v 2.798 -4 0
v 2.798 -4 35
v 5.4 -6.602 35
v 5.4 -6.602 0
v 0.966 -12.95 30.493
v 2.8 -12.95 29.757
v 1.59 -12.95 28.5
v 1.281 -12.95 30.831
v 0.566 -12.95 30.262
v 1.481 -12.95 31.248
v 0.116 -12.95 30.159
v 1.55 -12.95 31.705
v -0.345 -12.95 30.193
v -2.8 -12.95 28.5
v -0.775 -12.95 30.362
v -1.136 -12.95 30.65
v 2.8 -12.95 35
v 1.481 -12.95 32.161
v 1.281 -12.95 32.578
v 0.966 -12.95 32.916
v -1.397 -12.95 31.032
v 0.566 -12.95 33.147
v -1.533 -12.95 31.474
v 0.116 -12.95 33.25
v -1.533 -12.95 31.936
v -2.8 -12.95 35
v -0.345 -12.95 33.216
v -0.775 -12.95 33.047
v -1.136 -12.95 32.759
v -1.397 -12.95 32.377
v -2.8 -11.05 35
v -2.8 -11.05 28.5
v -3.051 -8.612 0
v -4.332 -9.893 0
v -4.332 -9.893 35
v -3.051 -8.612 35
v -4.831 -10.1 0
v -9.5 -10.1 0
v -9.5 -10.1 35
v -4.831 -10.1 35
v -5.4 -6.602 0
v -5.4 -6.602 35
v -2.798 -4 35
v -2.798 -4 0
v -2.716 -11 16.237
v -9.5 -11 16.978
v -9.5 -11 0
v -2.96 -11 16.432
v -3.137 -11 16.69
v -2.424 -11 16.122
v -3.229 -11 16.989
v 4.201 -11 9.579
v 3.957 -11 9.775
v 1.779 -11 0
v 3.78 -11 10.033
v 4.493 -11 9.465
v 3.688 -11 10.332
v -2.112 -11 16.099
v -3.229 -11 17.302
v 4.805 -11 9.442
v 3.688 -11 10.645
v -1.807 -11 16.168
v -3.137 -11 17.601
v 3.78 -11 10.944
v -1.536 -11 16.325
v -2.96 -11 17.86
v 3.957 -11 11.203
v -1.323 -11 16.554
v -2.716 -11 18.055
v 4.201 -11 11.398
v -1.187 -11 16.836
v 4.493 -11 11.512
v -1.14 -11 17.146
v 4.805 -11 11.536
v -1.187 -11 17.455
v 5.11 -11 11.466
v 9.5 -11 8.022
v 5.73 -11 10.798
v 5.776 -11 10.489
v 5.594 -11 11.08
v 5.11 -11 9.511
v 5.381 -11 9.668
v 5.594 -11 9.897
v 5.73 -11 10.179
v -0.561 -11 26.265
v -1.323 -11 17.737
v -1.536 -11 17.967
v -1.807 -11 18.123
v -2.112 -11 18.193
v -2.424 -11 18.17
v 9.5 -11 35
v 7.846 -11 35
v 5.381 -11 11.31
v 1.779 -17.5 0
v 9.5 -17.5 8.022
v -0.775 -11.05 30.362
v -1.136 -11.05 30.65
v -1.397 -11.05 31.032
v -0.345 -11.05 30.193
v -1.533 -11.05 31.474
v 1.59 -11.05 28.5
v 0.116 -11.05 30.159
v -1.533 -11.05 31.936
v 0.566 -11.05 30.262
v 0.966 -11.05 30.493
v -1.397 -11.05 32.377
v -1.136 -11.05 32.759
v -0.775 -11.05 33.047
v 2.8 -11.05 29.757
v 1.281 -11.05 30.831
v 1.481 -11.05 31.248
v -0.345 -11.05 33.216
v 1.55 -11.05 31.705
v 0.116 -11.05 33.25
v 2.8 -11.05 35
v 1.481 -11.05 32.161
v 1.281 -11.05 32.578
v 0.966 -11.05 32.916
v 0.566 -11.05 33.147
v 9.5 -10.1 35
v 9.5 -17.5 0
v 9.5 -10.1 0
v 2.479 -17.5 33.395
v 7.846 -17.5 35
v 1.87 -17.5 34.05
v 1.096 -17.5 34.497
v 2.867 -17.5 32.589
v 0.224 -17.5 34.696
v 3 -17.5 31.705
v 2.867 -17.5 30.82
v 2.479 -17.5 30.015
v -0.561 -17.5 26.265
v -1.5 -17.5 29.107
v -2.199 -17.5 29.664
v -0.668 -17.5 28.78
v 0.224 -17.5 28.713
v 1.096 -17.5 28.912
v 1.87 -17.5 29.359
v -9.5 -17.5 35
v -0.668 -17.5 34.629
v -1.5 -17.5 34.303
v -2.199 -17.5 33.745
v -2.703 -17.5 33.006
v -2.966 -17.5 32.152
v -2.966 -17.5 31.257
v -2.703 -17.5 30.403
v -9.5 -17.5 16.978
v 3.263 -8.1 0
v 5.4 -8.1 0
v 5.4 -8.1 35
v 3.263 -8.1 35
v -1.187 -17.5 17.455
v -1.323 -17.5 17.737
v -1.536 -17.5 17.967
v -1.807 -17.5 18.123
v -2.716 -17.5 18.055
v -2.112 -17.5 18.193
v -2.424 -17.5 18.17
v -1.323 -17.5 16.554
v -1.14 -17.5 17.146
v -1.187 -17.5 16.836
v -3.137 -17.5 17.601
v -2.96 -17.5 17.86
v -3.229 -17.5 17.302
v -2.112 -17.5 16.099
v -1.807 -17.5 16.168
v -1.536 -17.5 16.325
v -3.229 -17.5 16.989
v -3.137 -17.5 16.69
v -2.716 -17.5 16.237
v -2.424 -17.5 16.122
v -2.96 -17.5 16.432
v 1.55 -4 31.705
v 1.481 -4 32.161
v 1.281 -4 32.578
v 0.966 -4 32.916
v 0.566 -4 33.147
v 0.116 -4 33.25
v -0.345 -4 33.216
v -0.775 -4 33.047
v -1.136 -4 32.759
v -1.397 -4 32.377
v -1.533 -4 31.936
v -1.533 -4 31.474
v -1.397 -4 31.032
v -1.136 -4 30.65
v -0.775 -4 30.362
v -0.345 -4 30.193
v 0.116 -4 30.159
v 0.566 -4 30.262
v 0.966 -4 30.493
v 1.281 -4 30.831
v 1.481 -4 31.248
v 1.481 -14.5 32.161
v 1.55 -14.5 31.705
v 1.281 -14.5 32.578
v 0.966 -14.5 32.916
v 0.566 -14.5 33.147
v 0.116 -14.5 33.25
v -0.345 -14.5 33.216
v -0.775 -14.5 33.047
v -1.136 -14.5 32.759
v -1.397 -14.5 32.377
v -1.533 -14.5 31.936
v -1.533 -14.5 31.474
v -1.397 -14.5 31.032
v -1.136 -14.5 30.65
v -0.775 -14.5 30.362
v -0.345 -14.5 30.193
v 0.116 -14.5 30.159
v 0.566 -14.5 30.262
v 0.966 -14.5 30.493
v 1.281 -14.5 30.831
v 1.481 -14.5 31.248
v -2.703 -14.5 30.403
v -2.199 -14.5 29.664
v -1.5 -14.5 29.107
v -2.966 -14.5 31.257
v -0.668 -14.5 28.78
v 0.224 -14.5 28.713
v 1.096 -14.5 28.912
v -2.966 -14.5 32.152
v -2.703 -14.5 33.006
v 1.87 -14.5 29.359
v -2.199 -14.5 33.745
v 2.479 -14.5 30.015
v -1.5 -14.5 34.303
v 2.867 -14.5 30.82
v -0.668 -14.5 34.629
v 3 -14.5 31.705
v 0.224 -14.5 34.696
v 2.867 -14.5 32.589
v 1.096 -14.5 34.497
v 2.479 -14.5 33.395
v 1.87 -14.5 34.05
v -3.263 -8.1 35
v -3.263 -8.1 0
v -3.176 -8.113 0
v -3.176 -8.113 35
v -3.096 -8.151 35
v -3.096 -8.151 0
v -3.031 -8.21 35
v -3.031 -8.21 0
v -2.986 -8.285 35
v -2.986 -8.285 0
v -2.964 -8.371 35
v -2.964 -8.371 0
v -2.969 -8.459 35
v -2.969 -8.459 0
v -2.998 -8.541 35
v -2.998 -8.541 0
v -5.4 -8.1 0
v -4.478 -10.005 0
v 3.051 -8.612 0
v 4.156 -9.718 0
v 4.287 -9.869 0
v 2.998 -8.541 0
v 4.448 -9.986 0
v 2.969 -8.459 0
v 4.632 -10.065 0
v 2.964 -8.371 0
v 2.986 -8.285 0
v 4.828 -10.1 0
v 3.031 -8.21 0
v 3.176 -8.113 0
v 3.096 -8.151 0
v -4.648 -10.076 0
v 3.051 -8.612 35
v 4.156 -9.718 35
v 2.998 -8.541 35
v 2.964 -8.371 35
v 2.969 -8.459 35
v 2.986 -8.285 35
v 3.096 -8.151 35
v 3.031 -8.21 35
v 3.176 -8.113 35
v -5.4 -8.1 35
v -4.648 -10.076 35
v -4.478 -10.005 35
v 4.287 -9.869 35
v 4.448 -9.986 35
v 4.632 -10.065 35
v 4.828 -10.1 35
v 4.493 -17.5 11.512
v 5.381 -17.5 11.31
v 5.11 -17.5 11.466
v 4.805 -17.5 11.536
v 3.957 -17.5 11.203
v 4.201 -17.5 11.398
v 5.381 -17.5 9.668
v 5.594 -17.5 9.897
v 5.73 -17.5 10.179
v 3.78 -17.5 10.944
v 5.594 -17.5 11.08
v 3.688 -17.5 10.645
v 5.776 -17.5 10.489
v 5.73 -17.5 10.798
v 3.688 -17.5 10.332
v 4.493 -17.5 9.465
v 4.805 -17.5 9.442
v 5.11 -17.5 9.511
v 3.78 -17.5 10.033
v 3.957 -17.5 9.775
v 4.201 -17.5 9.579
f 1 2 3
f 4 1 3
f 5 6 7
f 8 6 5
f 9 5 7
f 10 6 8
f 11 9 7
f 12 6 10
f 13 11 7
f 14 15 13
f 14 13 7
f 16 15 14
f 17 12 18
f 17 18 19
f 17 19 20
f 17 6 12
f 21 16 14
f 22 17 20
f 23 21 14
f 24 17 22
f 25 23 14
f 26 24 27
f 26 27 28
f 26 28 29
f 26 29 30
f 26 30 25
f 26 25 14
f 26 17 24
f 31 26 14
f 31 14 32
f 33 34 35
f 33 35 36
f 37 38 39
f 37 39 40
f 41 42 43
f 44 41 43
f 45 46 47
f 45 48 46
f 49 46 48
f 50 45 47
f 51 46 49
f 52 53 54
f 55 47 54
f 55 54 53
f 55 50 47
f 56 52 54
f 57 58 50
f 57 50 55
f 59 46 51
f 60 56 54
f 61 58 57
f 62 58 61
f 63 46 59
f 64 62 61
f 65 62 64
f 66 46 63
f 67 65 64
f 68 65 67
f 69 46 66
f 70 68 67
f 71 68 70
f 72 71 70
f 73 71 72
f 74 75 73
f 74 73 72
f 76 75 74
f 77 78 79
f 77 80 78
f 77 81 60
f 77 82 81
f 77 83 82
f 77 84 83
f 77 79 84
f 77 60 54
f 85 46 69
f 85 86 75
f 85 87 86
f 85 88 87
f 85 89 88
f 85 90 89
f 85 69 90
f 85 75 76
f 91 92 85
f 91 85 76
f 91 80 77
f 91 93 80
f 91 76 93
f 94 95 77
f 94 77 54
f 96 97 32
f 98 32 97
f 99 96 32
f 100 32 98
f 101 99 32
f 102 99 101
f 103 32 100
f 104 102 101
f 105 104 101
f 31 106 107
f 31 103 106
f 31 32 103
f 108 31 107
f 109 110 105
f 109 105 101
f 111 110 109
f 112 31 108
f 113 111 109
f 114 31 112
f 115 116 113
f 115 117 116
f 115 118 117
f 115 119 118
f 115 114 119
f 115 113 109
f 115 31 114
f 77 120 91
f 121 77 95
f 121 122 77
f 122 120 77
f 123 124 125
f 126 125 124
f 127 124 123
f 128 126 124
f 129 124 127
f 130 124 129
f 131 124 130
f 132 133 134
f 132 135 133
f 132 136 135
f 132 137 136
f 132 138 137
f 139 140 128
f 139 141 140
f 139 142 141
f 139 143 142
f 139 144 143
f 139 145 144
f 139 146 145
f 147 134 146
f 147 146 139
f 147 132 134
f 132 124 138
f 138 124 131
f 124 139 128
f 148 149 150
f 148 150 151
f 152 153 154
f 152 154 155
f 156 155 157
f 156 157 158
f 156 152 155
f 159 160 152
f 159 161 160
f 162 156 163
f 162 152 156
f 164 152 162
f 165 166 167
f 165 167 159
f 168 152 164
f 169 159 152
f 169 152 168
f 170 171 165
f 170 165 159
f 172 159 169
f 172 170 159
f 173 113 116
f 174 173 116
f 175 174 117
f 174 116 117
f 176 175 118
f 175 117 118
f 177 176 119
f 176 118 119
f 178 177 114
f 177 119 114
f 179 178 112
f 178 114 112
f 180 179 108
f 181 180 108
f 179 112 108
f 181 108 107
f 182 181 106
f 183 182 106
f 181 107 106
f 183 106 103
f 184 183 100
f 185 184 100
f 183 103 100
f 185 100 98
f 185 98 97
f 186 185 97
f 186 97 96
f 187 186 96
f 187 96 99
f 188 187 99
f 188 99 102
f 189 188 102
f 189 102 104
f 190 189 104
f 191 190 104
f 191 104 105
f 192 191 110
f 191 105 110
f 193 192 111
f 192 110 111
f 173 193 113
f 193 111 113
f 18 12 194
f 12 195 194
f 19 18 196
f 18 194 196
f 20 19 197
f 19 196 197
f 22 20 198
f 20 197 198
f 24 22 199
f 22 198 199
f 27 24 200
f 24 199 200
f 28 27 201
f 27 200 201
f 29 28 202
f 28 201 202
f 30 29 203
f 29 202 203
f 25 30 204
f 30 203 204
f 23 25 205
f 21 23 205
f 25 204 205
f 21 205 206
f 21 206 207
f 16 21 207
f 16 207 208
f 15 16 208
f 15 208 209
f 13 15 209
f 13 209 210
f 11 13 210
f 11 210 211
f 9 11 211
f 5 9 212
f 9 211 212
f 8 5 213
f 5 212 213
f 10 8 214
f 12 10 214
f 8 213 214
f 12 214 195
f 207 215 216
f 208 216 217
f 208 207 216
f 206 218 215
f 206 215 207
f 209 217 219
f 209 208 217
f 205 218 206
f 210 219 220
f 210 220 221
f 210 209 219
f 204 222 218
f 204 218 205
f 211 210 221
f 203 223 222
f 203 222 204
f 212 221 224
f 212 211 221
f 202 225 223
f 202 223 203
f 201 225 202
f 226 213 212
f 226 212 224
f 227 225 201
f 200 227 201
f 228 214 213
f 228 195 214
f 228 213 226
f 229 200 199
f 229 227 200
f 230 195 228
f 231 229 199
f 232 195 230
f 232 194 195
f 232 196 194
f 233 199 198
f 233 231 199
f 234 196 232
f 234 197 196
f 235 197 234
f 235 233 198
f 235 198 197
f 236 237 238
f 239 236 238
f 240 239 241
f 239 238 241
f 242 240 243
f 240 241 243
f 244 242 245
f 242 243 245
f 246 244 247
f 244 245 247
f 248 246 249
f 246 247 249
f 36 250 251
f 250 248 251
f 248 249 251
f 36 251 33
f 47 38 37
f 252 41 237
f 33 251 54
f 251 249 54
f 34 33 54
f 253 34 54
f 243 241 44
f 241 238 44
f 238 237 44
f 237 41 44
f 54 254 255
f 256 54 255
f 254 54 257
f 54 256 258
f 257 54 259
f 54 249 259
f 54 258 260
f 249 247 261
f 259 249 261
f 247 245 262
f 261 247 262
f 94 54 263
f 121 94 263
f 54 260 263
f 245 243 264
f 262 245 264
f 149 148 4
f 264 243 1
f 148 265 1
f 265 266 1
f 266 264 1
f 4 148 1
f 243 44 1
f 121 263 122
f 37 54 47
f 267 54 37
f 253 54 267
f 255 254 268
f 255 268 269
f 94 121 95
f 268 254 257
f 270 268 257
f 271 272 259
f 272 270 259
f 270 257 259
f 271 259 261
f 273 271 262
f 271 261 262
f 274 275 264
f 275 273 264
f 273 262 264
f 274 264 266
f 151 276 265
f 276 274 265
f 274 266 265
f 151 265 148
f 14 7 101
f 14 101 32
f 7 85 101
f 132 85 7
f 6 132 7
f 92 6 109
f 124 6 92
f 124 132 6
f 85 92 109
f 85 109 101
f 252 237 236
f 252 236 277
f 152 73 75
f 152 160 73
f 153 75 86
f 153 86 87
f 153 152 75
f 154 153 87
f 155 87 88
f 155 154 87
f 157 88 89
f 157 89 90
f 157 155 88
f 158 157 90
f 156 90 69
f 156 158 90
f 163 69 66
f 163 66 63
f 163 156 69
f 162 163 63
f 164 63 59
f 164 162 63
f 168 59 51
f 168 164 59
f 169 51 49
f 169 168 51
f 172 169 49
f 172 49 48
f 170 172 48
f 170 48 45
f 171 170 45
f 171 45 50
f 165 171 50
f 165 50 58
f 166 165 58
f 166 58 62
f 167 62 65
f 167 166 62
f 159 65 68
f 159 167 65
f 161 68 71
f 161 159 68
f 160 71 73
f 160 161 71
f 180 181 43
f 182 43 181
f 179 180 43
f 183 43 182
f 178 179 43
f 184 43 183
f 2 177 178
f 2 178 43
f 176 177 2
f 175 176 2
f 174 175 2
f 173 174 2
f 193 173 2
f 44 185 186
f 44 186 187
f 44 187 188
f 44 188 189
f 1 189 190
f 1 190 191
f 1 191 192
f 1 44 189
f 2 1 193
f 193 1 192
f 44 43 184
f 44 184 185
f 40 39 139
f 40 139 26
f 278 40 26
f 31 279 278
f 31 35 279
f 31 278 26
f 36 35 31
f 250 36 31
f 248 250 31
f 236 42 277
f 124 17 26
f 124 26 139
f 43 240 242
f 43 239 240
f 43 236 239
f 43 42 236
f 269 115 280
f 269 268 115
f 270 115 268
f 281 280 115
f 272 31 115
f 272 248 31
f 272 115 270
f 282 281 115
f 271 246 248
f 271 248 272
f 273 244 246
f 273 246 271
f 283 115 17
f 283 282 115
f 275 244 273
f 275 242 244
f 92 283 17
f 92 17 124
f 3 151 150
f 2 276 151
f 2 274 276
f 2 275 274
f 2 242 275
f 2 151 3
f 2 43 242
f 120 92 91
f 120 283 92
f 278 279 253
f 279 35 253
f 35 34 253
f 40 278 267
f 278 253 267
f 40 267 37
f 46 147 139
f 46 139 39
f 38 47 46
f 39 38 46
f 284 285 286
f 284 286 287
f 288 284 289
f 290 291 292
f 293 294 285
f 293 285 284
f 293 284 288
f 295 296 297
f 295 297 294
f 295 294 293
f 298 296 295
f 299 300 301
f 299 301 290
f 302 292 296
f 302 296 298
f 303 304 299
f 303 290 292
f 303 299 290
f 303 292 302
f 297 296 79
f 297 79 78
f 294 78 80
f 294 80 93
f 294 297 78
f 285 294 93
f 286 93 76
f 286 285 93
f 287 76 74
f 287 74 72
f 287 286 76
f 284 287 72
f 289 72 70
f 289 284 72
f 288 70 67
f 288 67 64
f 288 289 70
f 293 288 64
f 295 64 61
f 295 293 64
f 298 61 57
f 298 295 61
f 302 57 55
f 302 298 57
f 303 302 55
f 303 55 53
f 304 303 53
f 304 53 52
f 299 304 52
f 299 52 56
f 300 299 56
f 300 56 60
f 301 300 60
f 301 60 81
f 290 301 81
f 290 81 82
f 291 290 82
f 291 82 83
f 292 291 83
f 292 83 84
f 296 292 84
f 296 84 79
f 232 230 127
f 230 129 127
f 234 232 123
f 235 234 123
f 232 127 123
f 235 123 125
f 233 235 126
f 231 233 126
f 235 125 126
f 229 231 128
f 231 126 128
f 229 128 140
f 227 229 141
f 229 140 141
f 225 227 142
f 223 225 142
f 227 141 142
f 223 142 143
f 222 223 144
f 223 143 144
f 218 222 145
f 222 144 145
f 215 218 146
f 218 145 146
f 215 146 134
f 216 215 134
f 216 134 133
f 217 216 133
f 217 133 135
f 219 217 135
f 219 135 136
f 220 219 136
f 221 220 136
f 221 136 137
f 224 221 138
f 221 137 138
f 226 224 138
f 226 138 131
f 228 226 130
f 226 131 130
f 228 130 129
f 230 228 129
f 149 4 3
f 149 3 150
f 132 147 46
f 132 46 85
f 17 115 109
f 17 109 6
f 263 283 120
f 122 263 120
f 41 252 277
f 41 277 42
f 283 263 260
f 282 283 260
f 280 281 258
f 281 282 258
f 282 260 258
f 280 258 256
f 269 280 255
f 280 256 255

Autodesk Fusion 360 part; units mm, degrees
sketch "Sketch1" plane through (0, 0, 0) normal (0, 0, 1) x (1, 0, 0)
  line L0 (10, 4.8314) -> (10, 9.5)
  line L1 (-4.4022, -9.8222) -> (-3.1214, -8.5414)
  arc A0 (3.2628, -8.2) -> (3.1214, -8.5414) centre (3.2628, -8.4) ccw
  line L2 (-5.5, 6.5607) -> (-5.5, 8.2)
  line L3 (-5.5, -6.5607) -> (-2.8393, -3.9)
  line L4 (-4.8314, 10) -> (-9.5, 10)
  line L5 (2.8393, 3.9) -> (-2.8393, 3.9)
  arc A1 (-10, -9.5) -> (-9.5, -10) centre (-9.5, -9.5) ccw
  line L6 (9.5, 10) -> (4.8314, 10)
  arc A2 (-3.2628, 8.2) -> (-3.1214, 8.5414) centre (-3.2628, 8.4) ccw
  line L7 (-8.2, 3.2628) -> (-8.2, 5.5)
  line L8 (2.8393, -3.9) -> (5.5, -6.5607)
  line L9 (-10, 9.5) -> (-10, 4.9)
  arc A3 (9.5, -10) -> (10, -9.5) centre (9.5, -9.5) ccw
  line L10 (-6.5607, -5.5) -> (-8.2, -5.5)
  line L11 (3.1214, -8.5414) -> (4.2336, -9.6536)
  line L12 (-8.2, -5.5) -> (-8.2, -3.2628)
  line L13 (-9.9987, -4.7917) -> (-10, -9.5)
  line L14 (10, -9.5) -> (10, -4.8314)
  line L15 (3.2628, 8.2) -> (5.5, 8.2)
  arc A4 (8.5414, -3.1214) -> (8.2, -3.2628) centre (8.4, -3.2628) ccw
  arc A5 (-3.1214, -8.5414) -> (-3.2628, -8.2) centre (-3.2628, -8.4) ccw
  line L16 (4.8314, -10) -> (9.5, -10)
  line L17 (-3.9, -2.8393) -> (-6.5607, -5.5)
  line L18 (-3.2628, -8.2) -> (-5.5, -8.2)
  line L19 (3.9, 2.8393) -> (6.5607, 5.5)
  line L20 (-3.1214, 8.5414) -> (-4.4312, 9.8494)
  line L21 (8.2, -5.5) -> (6.5607, -5.5)
  arc A6 (-10, 4.9) -> (-9.8494, 4.4312) centre (-9.3734, 4.8428) ccw
  line L22 (8.5414, 3.1214) -> (9.8222, 4.4022)
  circle A7 centre (0, 0) radius 2.1
  line L23 (3.9, -2.8393) -> (3.9, 2.8393)
  line L24 (6.5607, -5.5) -> (3.9, -2.8393)
  line L25 (5.5, -6.5607) -> (5.5, -8.2)
  line L26 (8.2, -3.2628) -> (8.2, -5.5)
  arc A8 (10, -4.8314) -> (9.8222, -4.4022) centre (9.3929, -4.8314) ccw
  line L27 (-5.5, -8.2) -> (-5.5, -6.5607)
  arc A9 (-4.8314, -10) -> (-4.4022, -9.8222) centre (-4.8314, -9.3929) ccw
  line L28 (5.5, -8.2) -> (3.2628, -8.2)
  line L29 (9.8222, -4.4022) -> (8.5414, -3.1214)
  arc A10 (-9.8222, -4.4022) -> (-9.9987, -4.7917) centre (-9.3929, -4.8314) ccw
  line L30 (-8.5414, -3.1214) -> (-9.8222, -4.4022)
  arc A11 (4.2336, -9.6536) -> (4.8314, -10) centre (4.8837, -9.2207) ccw
  arc A12 (-8.2, -3.2628) -> (-8.5414, -3.1214) centre (-8.4, -3.2628) ccw
  line L31 (-9.5, -10) -> (-4.8314, -10)
  line L32 (-2.8393, -3.9) -> (2.8393, -3.9)
  line L33 (-5.8557, 10) -> (6.4454, 10) construction
  arc A13 (10, 9.5) -> (9.5, 10) centre (9.5, 9.5) ccw
  arc A14 (3.1214, 8.5414) -> (3.2628, 8.2) centre (3.2628, 8.4) ccw
  line L34 (-5.5, 8.2) -> (-3.2628, 8.2)
  line L35 (-3.9, 2.8393) -> (-3.9, -2.8393)
  line L36 (4.4022, 9.8222) -> (3.1214, 8.5414)
  arc A15 (4.8314, 10) -> (4.4022, 9.8222) centre (4.8314, 9.3929) ccw
  line L37 (-9.8494, 4.4312) -> (-8.5414, 3.1214)
  line L38 (5.5, 8.2) -> (5.5, 6.5607)
  line L39 (6.5607, 5.5) -> (8.2, 5.5)
  arc A16 (-8.5414, 3.1214) -> (-8.2, 3.2628) centre (-8.4, 3.2628) ccw
  line L40 (8.2, 5.5) -> (8.2, 3.2628)
  arc A17 (-4.4312, 9.8494) -> (-4.8314, 10) centre (-4.8314, 9.3929) ccw
  line L41 (-8.2, 5.5) -> (-6.5607, 5.5)
  arc A18 (9.8222, 4.4022) -> (10, 4.8314) centre (9.3929, 4.8314) ccw
  arc A19 (-9.5, 10) -> (-10, 9.5) centre (-9.5, 9.5) ccw
  line L42 (-2.8393, 3.9) -> (-5.5, 6.5607)
  line L43 (-6.5607, 5.5) -> (-3.9, 2.8393)
  arc A20 (8.2, 3.2628) -> (8.5414, 3.1214) centre (8.4, 3.2628) ccw
  line L44 (5.5, 6.5607) -> (2.8393, 3.9)
  line L45 (5.4, -6.6021) -> (5.4, -8.1)
  line L46 (5.4, -8.1) -> (3.2628, -8.1)
  arc A21 (3.2628, -8.1) -> (3.0507, -8.6121) centre (3.2628, -8.4) ccw
  line L47 (3.0507, -8.6121) -> (4.1561, -9.7175)
  arc A22 (4.1561, -9.7175) -> (4.8282, -10.1) centre (4.8837, -9.2207) ccw
  line L48 (4.8282, -10.1) -> (9.5, -10.1)
  arc A23 (9.5, -10.1) -> (10.1, -9.5) centre (9.5, -9.5) ccw
  line L49 (10.1, -9.5) -> (10.1, -4.8314)
  arc A24 (10.1, -4.8314) -> (9.8929, -4.3315) centre (9.3929, -4.8314) ccw
  line L50 (9.8929, -4.3315) -> (8.6121, -3.0507)
  arc A25 (8.6121, -3.0507) -> (8.1, -3.2628) centre (8.4, -3.2628) ccw
  line L51 (8.1, -3.2628) -> (8.1, -5.4)
  line L52 (8.1, -5.4) -> (6.6021, -5.4)
  line L53 (6.6021, -5.4) -> (4, -2.7979)
  line L54 (4, -2.7979) -> (4, 2.7979)
  line L55 (4, 2.7979) -> (6.6021, 5.4)
  line L56 (6.6021, 5.4) -> (8.1, 5.4)
  line L57 (8.1, 5.4) -> (8.1, 3.2628)
  arc A26 (8.1, 3.2628) -> (8.6121, 3.0507) centre (8.4, 3.2628) ccw
  line L58 (8.6121, 3.0507) -> (9.8929, 4.3315)
  arc A27 (9.8929, 4.3315) -> (10.1, 4.8314) centre (9.3929, 4.8314) ccw
  line L59 (10.1, 4.8314) -> (10.1, 9.5)
  arc A28 (10.1, 9.5) -> (9.5, 10.1) centre (9.5, 9.5) ccw
  line L60 (9.5, 10.1) -> (4.8314, 10.1)
  arc A29 (4.8314, 10.1) -> (4.3315, 9.8929) centre (4.8314, 9.3929) ccw
  line L61 (4.3315, 9.8929) -> (3.0507, 8.6121)
  arc A30 (3.0507, 8.6121) -> (3.2628, 8.1) centre (3.2628, 8.4) ccw
  line L62 (3.2628, 8.1) -> (5.4, 8.1)
  line L63 (5.4, 8.1) -> (5.4, 6.6021)
  line L64 (5.4, 6.6021) -> (2.7979, 4)
  line L65 (2.7979, 4) -> (-2.7979, 4)
  line L66 (-2.7979, 4) -> (-5.4, 6.6021)
  line L67 (-5.4, 6.6021) -> (-5.4, 8.1)
  line L68 (-5.4, 8.1) -> (-3.2628, 8.1)
  arc A31 (-3.2628, 8.1) -> (-3.0509, 8.6124) centre (-3.2628, 8.4) ccw
  line L69 (-3.0509, 8.6124) -> (-4.3627, 9.9223)
  arc A32 (-4.3627, 9.9223) -> (-4.8314, 10.1) centre (-4.8314, 9.3929) ccw
  line L70 (-4.8314, 10.1) -> (-9.5, 10.1)
  arc A33 (-9.5, 10.1) -> (-10.1, 9.5) centre (-9.5, 9.5) ccw
  line L71 (-10.1, 9.5) -> (-10.1, 4.9044)
  arc A34 (-10.1, 4.9044) -> (-9.9226, 4.363) centre (-9.3734, 4.8428) ccw
  line L72 (-9.9226, 4.363) -> (-8.6124, 3.0509)
  arc A35 (-8.6124, 3.0509) -> (-8.1, 3.2628) centre (-8.4, 3.2628) ccw
  line L73 (-8.1, 3.2628) -> (-8.1, 5.4)
  line L74 (-8.1, 5.4) -> (-6.6021, 5.4)
  line L75 (-6.6021, 5.4) -> (-4, 2.7979)
  line L76 (-4, 2.7979) -> (-4, -2.7979)
  line L77 (-4, -2.7979) -> (-6.6021, -5.4)
  line L78 (-6.6021, -5.4) -> (-8.1, -5.4)
  line L79 (-8.1, -5.4) -> (-8.1, -3.2628)
  arc A36 (-8.1, -3.2628) -> (-8.6121, -3.0507) centre (-8.4, -3.2628) ccw
  line L80 (-8.6121, -3.0507) -> (-9.8929, -4.3315)
  arc A37 (-9.8929, -4.3315) -> (-10.0987, -4.7886) centre (-9.3929, -4.8314) ccw
  line L81 (-10.0987, -4.7886) -> (-10.1, -9.4997)
  arc A38 (-10.1, -9.4997) -> (-9.5, -10.1) centre (-9.5, -9.5) ccw
  line L82 (-9.5, -10.1) -> (-4.8314, -10.1)
  arc A39 (-4.8314, -10.1) -> (-4.3315, -9.8929) centre (-4.8314, -9.3929) ccw
  line L83 (-4.3315, -9.8929) -> (-3.0507, -8.6121)
  arc A40 (-3.0507, -8.6121) -> (-3.2628, -8.1) centre (-3.2628, -8.4) ccw
  line L84 (-3.2628, -8.1) -> (-5.4, -8.1)
  line L85 (-5.4, -8.1) -> (-5.4, -6.6021)
  line L86 (-5.4, -6.6021) -> (-2.7979, -4)
  line L87 (-2.7979, -4) -> (2.7979, -4)
  line L88 (2.7979, -4) -> (5.4, -6.6021)
  line L89 (-9.5, -9.5) -> (9.5, -9.5)
  line L90 (9.5, -9.5) -> (9.5, -17.5)
  line L91 (9.5, -17.5) -> (-9.5, -17.5)
  line L92 (-9.5, -17.5) -> (-9.5, -9.5)
  dimension "d1" = 0.1
  dimension "d2" = 8
extrude "Extrude1" add sketch "Sketch1" along normal blind 35 contours L47 A22 L48 L82 A39 L83 L89 L90 L91 L92 | L45 L46 A21 L47 L83 A40 L84 L85 L86 L87 L88 L89
sketch "Sketch2" plane through (0, -17.5, 0) normal (0, -1, 0) x (1, 0, 0)
  line L0 (-9.5, 0) -> (9.5, 0)
  line L1 (9.5, 0) -> (9.5, 35)
  line L2 (9.5, 35) -> (-9.5, 35)
  line L3 (-9.5, 35) -> (-9.5, 0)
  line L4 (-9.5114, 14.292) -> (9.5, 17.5) construction
  line L5 (13.7765, 12.4651) -> (0.5613, -1.2651)
  line L6 (0.5613, -1.2651) -> (-13.7765, 12.5349)
  line L7 (-13.7765, 12.5349) -> (-0.5613, 26.2651)
  line L8 (-0.5613, 26.2651) -> (13.7765, 12.4651)
  line L9 (13.7765, 12.4651) -> (-13.7765, 12.5349) construction
  line L10 (0.5613, -1.2651) -> (-0.5613, 26.2651) construction
  line L11 (-0.5613, 26.2651) -> (-5.901, 20.7173) construction
  line L12 (-5.901, 20.7173) -> (8.4368, 6.9173) construction
  line L13 (-5.901, 20.7173) -> (-2.1905, 17.1459) construction
  line L14 (-2.1905, 17.1459) -> (4.7263, 10.4887) construction
  line L15 (4.7263, 10.4887) -> (8.4368, 6.9173) construction
  circle A0 centre (-2.1905, 17.1459) radius 1.05
  circle A1 centre (4.7263, 10.4887) radius 1.05
  line L16 (-0.5613, 26.2651) -> (8.1636, 35.3299)
  point P0 (0, 12.5)
  dimension "d5" = 19.9
  dimension "d6" = 7.7
  dimension "d7" = 5.15
  dimension "d8" = 9.6
  dimension "d9" = 5.15
  dimension "d10" = 2.1
  dimension "d11" = 2.1
extrude "Extrude2" cut sketch "Sketch2" against normal blind 6.5 contours L0 L3 L6 | L0 L1 L3 L5 L6 L7 L8 | L1 L2 L8 L16
sketch "Sketch3" plane through (0, -17.5, 0) normal (0, -1, 0) x (1, 0, 0)
  line L0 (-9.5, 16.978) -> (7.846, 35)
  line L1 (7.846, 35) -> (-9.5, 35)
  line L2 (-9.5, 35) -> (-9.5, 16.978)
  circle A0 centre (0, 31.7046) radius 1.55
  circle A1 centre (0, 31.7046) radius 3
  line L3 (-9.5, 35) -> (0, 35) construction
  line L4 (0, 35) -> (0, 26.8482) construction
  line L5 (0, 30.9241) -> (-9.5, 30.9241) construction
  dimension "d14" = 3.1
  dimension "d15" = 6
  dimension "d16" = 9.5
extrude "Extrude3" cut sketch "Sketch3" against normal blind 20 contours A0
extrude "Extrude4" cut sketch "Sketch3" against normal blind 3 contours A1
sketch "Sketch4" plane through (0, 0, 35) normal (0, 0, 1) x (-1, 0, 0)
  line L0 (-7.846, 17.5) -> (-7.846, 11)
  line L1 (-7.846, 11) -> (-9.5, 11)
  line L2 (-9.5, 11) -> (-9.5, 10.1)
  line L3 (-9.5, 10.1) -> (-4.8282, 10.1)
  arc A0 (-4.1561, 9.7175) -> (-4.8282, 10.1) centre (-4.8837, 9.2207) ccw
  line L4 (-4.1561, 9.7175) -> (-3.0507, 8.6121)
  arc A1 (-3.2628, 8.1) -> (-3.0507, 8.6121) centre (-3.2628, 8.4) ccw
  line L5 (-3.2628, 8.1) -> (-5.4, 8.1)
  line L6 (-5.4, 8.1) -> (-5.4, 6.6021)
  line L7 (-5.4, 6.6021) -> (-2.7979, 4)
  line L8 (-2.7979, 4) -> (2.7979, 4)
  line L9 (2.7979, 4) -> (5.4, 6.6021)
  line L10 (5.4, 6.6021) -> (5.4, 8.1)
  line L11 (5.4, 8.1) -> (3.2628, 8.1)
  arc A2 (3.0507, 8.6121) -> (3.2628, 8.1) centre (3.2628, 8.4) ccw
  line L12 (3.0507, 8.6121) -> (4.3315, 9.8929)
  arc A3 (4.8314, 10.1) -> (4.3315, 9.8929) centre (4.8314, 9.3929) ccw
  line L13 (4.8314, 10.1) -> (9.5, 10.1)
  line L14 (9.5, 10.1) -> (9.5, 17.5)
  line L15 (9.5, 17.5) -> (-7.846, 17.5)
  line L16 (2.8, 11.05) -> (-2.8, 11.05)
  line L17 (-2.8, 11.05) -> (-2.8, 12.95)
  line L18 (-2.8, 12.95) -> (2.8, 12.95)
  line L19 (2.8, 12.95) -> (2.8, 11.05)
  line L20 (2.8, 11.05) -> (-2.8, 12.95) construction
  line L21 (-2.8, 11.05) -> (2.8, 12.95) construction
  line L22 (9.5, 10.5577) -> (-9.5, 10.55) construction
  line L23 (0, 12) -> (0, 17.5) construction
  point P0 (0, 12)
  dimension "d21" = 5.6
  dimension "d22" = 1.9
  dimension "d25" = 5.5
extrude "Extrude5" cut sketch "Sketch4" against normal blind 6.5 contours L16 L17 L18 L19
